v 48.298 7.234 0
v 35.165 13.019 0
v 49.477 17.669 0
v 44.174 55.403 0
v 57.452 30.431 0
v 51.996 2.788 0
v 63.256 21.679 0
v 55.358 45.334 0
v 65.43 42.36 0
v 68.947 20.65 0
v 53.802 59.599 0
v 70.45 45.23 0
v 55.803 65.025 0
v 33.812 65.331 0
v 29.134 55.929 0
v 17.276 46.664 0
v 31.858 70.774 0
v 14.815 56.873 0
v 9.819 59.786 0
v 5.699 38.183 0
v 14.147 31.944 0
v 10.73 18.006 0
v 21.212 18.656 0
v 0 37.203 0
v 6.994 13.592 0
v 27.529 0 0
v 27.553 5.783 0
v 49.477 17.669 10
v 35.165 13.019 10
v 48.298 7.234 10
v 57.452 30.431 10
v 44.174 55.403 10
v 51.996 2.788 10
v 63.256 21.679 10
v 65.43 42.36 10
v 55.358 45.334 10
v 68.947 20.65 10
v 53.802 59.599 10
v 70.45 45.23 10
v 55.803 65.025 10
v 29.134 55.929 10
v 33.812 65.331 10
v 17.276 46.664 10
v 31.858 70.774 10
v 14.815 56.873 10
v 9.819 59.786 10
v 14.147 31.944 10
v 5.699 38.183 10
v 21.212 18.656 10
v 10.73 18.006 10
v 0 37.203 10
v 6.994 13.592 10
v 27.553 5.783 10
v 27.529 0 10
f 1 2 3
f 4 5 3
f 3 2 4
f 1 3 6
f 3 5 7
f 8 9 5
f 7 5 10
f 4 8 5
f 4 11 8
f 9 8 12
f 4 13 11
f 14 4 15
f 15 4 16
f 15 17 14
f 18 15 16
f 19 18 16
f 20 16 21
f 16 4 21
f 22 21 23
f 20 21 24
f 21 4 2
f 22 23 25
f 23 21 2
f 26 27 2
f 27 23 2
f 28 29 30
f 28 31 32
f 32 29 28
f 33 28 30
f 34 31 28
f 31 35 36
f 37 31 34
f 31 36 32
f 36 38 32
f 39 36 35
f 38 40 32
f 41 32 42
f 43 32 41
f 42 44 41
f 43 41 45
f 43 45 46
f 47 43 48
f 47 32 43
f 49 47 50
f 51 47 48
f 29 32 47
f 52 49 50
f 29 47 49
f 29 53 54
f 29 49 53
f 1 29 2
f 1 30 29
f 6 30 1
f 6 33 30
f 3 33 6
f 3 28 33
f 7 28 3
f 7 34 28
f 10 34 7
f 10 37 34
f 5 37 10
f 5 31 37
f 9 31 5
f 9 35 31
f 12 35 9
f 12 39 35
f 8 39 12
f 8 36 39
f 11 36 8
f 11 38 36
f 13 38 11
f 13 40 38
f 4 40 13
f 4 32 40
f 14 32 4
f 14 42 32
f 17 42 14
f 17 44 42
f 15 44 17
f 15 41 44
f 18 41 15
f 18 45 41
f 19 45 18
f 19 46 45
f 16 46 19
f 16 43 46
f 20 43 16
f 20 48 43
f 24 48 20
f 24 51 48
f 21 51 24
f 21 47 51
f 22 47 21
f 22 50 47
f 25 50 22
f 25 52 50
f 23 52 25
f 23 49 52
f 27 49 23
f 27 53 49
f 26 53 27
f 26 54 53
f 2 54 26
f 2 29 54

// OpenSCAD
$fn = 32;

// ----------------------------------------------------------------------
// Fan rotor section: 9 blades, 22 mm hub radius, 14 mm blades
// ----------------------------------------------------------------------

// --- parameters (mm) ---
profile_height = 10;      // extrusion height
profile_points = 27;      // points of the closed outline

profile = [[57.452, 30.431], [65.43, 42.36], [70.45, 45.23], [55.358, 45.334], [53.802, 59.599], [55.803, 65.025], [44.174, 55.403], [33.812, 65.331], [31.858, 70.774], [29.134, 55.929], [14.815, 56.873], [9.819, 59.786], [17.276, 46.664], [5.699, 38.183], [0, 37.203], [14.147, 31.944], [10.73, 18.006], [6.994, 13.592], [21.212, 18.656], [27.553, 5.783], [27.529, 0], [35.165, 13.019], [48.298, 7.234], [51.996, 2.788], [49.477, 17.669], [63.256, 21.679], [68.947, 20.65]];  // single closed polygon, 27 points, counter clockwise

// --- the one profile operation ---
linear_extrude(height = profile_height) polygon(points = profile);
